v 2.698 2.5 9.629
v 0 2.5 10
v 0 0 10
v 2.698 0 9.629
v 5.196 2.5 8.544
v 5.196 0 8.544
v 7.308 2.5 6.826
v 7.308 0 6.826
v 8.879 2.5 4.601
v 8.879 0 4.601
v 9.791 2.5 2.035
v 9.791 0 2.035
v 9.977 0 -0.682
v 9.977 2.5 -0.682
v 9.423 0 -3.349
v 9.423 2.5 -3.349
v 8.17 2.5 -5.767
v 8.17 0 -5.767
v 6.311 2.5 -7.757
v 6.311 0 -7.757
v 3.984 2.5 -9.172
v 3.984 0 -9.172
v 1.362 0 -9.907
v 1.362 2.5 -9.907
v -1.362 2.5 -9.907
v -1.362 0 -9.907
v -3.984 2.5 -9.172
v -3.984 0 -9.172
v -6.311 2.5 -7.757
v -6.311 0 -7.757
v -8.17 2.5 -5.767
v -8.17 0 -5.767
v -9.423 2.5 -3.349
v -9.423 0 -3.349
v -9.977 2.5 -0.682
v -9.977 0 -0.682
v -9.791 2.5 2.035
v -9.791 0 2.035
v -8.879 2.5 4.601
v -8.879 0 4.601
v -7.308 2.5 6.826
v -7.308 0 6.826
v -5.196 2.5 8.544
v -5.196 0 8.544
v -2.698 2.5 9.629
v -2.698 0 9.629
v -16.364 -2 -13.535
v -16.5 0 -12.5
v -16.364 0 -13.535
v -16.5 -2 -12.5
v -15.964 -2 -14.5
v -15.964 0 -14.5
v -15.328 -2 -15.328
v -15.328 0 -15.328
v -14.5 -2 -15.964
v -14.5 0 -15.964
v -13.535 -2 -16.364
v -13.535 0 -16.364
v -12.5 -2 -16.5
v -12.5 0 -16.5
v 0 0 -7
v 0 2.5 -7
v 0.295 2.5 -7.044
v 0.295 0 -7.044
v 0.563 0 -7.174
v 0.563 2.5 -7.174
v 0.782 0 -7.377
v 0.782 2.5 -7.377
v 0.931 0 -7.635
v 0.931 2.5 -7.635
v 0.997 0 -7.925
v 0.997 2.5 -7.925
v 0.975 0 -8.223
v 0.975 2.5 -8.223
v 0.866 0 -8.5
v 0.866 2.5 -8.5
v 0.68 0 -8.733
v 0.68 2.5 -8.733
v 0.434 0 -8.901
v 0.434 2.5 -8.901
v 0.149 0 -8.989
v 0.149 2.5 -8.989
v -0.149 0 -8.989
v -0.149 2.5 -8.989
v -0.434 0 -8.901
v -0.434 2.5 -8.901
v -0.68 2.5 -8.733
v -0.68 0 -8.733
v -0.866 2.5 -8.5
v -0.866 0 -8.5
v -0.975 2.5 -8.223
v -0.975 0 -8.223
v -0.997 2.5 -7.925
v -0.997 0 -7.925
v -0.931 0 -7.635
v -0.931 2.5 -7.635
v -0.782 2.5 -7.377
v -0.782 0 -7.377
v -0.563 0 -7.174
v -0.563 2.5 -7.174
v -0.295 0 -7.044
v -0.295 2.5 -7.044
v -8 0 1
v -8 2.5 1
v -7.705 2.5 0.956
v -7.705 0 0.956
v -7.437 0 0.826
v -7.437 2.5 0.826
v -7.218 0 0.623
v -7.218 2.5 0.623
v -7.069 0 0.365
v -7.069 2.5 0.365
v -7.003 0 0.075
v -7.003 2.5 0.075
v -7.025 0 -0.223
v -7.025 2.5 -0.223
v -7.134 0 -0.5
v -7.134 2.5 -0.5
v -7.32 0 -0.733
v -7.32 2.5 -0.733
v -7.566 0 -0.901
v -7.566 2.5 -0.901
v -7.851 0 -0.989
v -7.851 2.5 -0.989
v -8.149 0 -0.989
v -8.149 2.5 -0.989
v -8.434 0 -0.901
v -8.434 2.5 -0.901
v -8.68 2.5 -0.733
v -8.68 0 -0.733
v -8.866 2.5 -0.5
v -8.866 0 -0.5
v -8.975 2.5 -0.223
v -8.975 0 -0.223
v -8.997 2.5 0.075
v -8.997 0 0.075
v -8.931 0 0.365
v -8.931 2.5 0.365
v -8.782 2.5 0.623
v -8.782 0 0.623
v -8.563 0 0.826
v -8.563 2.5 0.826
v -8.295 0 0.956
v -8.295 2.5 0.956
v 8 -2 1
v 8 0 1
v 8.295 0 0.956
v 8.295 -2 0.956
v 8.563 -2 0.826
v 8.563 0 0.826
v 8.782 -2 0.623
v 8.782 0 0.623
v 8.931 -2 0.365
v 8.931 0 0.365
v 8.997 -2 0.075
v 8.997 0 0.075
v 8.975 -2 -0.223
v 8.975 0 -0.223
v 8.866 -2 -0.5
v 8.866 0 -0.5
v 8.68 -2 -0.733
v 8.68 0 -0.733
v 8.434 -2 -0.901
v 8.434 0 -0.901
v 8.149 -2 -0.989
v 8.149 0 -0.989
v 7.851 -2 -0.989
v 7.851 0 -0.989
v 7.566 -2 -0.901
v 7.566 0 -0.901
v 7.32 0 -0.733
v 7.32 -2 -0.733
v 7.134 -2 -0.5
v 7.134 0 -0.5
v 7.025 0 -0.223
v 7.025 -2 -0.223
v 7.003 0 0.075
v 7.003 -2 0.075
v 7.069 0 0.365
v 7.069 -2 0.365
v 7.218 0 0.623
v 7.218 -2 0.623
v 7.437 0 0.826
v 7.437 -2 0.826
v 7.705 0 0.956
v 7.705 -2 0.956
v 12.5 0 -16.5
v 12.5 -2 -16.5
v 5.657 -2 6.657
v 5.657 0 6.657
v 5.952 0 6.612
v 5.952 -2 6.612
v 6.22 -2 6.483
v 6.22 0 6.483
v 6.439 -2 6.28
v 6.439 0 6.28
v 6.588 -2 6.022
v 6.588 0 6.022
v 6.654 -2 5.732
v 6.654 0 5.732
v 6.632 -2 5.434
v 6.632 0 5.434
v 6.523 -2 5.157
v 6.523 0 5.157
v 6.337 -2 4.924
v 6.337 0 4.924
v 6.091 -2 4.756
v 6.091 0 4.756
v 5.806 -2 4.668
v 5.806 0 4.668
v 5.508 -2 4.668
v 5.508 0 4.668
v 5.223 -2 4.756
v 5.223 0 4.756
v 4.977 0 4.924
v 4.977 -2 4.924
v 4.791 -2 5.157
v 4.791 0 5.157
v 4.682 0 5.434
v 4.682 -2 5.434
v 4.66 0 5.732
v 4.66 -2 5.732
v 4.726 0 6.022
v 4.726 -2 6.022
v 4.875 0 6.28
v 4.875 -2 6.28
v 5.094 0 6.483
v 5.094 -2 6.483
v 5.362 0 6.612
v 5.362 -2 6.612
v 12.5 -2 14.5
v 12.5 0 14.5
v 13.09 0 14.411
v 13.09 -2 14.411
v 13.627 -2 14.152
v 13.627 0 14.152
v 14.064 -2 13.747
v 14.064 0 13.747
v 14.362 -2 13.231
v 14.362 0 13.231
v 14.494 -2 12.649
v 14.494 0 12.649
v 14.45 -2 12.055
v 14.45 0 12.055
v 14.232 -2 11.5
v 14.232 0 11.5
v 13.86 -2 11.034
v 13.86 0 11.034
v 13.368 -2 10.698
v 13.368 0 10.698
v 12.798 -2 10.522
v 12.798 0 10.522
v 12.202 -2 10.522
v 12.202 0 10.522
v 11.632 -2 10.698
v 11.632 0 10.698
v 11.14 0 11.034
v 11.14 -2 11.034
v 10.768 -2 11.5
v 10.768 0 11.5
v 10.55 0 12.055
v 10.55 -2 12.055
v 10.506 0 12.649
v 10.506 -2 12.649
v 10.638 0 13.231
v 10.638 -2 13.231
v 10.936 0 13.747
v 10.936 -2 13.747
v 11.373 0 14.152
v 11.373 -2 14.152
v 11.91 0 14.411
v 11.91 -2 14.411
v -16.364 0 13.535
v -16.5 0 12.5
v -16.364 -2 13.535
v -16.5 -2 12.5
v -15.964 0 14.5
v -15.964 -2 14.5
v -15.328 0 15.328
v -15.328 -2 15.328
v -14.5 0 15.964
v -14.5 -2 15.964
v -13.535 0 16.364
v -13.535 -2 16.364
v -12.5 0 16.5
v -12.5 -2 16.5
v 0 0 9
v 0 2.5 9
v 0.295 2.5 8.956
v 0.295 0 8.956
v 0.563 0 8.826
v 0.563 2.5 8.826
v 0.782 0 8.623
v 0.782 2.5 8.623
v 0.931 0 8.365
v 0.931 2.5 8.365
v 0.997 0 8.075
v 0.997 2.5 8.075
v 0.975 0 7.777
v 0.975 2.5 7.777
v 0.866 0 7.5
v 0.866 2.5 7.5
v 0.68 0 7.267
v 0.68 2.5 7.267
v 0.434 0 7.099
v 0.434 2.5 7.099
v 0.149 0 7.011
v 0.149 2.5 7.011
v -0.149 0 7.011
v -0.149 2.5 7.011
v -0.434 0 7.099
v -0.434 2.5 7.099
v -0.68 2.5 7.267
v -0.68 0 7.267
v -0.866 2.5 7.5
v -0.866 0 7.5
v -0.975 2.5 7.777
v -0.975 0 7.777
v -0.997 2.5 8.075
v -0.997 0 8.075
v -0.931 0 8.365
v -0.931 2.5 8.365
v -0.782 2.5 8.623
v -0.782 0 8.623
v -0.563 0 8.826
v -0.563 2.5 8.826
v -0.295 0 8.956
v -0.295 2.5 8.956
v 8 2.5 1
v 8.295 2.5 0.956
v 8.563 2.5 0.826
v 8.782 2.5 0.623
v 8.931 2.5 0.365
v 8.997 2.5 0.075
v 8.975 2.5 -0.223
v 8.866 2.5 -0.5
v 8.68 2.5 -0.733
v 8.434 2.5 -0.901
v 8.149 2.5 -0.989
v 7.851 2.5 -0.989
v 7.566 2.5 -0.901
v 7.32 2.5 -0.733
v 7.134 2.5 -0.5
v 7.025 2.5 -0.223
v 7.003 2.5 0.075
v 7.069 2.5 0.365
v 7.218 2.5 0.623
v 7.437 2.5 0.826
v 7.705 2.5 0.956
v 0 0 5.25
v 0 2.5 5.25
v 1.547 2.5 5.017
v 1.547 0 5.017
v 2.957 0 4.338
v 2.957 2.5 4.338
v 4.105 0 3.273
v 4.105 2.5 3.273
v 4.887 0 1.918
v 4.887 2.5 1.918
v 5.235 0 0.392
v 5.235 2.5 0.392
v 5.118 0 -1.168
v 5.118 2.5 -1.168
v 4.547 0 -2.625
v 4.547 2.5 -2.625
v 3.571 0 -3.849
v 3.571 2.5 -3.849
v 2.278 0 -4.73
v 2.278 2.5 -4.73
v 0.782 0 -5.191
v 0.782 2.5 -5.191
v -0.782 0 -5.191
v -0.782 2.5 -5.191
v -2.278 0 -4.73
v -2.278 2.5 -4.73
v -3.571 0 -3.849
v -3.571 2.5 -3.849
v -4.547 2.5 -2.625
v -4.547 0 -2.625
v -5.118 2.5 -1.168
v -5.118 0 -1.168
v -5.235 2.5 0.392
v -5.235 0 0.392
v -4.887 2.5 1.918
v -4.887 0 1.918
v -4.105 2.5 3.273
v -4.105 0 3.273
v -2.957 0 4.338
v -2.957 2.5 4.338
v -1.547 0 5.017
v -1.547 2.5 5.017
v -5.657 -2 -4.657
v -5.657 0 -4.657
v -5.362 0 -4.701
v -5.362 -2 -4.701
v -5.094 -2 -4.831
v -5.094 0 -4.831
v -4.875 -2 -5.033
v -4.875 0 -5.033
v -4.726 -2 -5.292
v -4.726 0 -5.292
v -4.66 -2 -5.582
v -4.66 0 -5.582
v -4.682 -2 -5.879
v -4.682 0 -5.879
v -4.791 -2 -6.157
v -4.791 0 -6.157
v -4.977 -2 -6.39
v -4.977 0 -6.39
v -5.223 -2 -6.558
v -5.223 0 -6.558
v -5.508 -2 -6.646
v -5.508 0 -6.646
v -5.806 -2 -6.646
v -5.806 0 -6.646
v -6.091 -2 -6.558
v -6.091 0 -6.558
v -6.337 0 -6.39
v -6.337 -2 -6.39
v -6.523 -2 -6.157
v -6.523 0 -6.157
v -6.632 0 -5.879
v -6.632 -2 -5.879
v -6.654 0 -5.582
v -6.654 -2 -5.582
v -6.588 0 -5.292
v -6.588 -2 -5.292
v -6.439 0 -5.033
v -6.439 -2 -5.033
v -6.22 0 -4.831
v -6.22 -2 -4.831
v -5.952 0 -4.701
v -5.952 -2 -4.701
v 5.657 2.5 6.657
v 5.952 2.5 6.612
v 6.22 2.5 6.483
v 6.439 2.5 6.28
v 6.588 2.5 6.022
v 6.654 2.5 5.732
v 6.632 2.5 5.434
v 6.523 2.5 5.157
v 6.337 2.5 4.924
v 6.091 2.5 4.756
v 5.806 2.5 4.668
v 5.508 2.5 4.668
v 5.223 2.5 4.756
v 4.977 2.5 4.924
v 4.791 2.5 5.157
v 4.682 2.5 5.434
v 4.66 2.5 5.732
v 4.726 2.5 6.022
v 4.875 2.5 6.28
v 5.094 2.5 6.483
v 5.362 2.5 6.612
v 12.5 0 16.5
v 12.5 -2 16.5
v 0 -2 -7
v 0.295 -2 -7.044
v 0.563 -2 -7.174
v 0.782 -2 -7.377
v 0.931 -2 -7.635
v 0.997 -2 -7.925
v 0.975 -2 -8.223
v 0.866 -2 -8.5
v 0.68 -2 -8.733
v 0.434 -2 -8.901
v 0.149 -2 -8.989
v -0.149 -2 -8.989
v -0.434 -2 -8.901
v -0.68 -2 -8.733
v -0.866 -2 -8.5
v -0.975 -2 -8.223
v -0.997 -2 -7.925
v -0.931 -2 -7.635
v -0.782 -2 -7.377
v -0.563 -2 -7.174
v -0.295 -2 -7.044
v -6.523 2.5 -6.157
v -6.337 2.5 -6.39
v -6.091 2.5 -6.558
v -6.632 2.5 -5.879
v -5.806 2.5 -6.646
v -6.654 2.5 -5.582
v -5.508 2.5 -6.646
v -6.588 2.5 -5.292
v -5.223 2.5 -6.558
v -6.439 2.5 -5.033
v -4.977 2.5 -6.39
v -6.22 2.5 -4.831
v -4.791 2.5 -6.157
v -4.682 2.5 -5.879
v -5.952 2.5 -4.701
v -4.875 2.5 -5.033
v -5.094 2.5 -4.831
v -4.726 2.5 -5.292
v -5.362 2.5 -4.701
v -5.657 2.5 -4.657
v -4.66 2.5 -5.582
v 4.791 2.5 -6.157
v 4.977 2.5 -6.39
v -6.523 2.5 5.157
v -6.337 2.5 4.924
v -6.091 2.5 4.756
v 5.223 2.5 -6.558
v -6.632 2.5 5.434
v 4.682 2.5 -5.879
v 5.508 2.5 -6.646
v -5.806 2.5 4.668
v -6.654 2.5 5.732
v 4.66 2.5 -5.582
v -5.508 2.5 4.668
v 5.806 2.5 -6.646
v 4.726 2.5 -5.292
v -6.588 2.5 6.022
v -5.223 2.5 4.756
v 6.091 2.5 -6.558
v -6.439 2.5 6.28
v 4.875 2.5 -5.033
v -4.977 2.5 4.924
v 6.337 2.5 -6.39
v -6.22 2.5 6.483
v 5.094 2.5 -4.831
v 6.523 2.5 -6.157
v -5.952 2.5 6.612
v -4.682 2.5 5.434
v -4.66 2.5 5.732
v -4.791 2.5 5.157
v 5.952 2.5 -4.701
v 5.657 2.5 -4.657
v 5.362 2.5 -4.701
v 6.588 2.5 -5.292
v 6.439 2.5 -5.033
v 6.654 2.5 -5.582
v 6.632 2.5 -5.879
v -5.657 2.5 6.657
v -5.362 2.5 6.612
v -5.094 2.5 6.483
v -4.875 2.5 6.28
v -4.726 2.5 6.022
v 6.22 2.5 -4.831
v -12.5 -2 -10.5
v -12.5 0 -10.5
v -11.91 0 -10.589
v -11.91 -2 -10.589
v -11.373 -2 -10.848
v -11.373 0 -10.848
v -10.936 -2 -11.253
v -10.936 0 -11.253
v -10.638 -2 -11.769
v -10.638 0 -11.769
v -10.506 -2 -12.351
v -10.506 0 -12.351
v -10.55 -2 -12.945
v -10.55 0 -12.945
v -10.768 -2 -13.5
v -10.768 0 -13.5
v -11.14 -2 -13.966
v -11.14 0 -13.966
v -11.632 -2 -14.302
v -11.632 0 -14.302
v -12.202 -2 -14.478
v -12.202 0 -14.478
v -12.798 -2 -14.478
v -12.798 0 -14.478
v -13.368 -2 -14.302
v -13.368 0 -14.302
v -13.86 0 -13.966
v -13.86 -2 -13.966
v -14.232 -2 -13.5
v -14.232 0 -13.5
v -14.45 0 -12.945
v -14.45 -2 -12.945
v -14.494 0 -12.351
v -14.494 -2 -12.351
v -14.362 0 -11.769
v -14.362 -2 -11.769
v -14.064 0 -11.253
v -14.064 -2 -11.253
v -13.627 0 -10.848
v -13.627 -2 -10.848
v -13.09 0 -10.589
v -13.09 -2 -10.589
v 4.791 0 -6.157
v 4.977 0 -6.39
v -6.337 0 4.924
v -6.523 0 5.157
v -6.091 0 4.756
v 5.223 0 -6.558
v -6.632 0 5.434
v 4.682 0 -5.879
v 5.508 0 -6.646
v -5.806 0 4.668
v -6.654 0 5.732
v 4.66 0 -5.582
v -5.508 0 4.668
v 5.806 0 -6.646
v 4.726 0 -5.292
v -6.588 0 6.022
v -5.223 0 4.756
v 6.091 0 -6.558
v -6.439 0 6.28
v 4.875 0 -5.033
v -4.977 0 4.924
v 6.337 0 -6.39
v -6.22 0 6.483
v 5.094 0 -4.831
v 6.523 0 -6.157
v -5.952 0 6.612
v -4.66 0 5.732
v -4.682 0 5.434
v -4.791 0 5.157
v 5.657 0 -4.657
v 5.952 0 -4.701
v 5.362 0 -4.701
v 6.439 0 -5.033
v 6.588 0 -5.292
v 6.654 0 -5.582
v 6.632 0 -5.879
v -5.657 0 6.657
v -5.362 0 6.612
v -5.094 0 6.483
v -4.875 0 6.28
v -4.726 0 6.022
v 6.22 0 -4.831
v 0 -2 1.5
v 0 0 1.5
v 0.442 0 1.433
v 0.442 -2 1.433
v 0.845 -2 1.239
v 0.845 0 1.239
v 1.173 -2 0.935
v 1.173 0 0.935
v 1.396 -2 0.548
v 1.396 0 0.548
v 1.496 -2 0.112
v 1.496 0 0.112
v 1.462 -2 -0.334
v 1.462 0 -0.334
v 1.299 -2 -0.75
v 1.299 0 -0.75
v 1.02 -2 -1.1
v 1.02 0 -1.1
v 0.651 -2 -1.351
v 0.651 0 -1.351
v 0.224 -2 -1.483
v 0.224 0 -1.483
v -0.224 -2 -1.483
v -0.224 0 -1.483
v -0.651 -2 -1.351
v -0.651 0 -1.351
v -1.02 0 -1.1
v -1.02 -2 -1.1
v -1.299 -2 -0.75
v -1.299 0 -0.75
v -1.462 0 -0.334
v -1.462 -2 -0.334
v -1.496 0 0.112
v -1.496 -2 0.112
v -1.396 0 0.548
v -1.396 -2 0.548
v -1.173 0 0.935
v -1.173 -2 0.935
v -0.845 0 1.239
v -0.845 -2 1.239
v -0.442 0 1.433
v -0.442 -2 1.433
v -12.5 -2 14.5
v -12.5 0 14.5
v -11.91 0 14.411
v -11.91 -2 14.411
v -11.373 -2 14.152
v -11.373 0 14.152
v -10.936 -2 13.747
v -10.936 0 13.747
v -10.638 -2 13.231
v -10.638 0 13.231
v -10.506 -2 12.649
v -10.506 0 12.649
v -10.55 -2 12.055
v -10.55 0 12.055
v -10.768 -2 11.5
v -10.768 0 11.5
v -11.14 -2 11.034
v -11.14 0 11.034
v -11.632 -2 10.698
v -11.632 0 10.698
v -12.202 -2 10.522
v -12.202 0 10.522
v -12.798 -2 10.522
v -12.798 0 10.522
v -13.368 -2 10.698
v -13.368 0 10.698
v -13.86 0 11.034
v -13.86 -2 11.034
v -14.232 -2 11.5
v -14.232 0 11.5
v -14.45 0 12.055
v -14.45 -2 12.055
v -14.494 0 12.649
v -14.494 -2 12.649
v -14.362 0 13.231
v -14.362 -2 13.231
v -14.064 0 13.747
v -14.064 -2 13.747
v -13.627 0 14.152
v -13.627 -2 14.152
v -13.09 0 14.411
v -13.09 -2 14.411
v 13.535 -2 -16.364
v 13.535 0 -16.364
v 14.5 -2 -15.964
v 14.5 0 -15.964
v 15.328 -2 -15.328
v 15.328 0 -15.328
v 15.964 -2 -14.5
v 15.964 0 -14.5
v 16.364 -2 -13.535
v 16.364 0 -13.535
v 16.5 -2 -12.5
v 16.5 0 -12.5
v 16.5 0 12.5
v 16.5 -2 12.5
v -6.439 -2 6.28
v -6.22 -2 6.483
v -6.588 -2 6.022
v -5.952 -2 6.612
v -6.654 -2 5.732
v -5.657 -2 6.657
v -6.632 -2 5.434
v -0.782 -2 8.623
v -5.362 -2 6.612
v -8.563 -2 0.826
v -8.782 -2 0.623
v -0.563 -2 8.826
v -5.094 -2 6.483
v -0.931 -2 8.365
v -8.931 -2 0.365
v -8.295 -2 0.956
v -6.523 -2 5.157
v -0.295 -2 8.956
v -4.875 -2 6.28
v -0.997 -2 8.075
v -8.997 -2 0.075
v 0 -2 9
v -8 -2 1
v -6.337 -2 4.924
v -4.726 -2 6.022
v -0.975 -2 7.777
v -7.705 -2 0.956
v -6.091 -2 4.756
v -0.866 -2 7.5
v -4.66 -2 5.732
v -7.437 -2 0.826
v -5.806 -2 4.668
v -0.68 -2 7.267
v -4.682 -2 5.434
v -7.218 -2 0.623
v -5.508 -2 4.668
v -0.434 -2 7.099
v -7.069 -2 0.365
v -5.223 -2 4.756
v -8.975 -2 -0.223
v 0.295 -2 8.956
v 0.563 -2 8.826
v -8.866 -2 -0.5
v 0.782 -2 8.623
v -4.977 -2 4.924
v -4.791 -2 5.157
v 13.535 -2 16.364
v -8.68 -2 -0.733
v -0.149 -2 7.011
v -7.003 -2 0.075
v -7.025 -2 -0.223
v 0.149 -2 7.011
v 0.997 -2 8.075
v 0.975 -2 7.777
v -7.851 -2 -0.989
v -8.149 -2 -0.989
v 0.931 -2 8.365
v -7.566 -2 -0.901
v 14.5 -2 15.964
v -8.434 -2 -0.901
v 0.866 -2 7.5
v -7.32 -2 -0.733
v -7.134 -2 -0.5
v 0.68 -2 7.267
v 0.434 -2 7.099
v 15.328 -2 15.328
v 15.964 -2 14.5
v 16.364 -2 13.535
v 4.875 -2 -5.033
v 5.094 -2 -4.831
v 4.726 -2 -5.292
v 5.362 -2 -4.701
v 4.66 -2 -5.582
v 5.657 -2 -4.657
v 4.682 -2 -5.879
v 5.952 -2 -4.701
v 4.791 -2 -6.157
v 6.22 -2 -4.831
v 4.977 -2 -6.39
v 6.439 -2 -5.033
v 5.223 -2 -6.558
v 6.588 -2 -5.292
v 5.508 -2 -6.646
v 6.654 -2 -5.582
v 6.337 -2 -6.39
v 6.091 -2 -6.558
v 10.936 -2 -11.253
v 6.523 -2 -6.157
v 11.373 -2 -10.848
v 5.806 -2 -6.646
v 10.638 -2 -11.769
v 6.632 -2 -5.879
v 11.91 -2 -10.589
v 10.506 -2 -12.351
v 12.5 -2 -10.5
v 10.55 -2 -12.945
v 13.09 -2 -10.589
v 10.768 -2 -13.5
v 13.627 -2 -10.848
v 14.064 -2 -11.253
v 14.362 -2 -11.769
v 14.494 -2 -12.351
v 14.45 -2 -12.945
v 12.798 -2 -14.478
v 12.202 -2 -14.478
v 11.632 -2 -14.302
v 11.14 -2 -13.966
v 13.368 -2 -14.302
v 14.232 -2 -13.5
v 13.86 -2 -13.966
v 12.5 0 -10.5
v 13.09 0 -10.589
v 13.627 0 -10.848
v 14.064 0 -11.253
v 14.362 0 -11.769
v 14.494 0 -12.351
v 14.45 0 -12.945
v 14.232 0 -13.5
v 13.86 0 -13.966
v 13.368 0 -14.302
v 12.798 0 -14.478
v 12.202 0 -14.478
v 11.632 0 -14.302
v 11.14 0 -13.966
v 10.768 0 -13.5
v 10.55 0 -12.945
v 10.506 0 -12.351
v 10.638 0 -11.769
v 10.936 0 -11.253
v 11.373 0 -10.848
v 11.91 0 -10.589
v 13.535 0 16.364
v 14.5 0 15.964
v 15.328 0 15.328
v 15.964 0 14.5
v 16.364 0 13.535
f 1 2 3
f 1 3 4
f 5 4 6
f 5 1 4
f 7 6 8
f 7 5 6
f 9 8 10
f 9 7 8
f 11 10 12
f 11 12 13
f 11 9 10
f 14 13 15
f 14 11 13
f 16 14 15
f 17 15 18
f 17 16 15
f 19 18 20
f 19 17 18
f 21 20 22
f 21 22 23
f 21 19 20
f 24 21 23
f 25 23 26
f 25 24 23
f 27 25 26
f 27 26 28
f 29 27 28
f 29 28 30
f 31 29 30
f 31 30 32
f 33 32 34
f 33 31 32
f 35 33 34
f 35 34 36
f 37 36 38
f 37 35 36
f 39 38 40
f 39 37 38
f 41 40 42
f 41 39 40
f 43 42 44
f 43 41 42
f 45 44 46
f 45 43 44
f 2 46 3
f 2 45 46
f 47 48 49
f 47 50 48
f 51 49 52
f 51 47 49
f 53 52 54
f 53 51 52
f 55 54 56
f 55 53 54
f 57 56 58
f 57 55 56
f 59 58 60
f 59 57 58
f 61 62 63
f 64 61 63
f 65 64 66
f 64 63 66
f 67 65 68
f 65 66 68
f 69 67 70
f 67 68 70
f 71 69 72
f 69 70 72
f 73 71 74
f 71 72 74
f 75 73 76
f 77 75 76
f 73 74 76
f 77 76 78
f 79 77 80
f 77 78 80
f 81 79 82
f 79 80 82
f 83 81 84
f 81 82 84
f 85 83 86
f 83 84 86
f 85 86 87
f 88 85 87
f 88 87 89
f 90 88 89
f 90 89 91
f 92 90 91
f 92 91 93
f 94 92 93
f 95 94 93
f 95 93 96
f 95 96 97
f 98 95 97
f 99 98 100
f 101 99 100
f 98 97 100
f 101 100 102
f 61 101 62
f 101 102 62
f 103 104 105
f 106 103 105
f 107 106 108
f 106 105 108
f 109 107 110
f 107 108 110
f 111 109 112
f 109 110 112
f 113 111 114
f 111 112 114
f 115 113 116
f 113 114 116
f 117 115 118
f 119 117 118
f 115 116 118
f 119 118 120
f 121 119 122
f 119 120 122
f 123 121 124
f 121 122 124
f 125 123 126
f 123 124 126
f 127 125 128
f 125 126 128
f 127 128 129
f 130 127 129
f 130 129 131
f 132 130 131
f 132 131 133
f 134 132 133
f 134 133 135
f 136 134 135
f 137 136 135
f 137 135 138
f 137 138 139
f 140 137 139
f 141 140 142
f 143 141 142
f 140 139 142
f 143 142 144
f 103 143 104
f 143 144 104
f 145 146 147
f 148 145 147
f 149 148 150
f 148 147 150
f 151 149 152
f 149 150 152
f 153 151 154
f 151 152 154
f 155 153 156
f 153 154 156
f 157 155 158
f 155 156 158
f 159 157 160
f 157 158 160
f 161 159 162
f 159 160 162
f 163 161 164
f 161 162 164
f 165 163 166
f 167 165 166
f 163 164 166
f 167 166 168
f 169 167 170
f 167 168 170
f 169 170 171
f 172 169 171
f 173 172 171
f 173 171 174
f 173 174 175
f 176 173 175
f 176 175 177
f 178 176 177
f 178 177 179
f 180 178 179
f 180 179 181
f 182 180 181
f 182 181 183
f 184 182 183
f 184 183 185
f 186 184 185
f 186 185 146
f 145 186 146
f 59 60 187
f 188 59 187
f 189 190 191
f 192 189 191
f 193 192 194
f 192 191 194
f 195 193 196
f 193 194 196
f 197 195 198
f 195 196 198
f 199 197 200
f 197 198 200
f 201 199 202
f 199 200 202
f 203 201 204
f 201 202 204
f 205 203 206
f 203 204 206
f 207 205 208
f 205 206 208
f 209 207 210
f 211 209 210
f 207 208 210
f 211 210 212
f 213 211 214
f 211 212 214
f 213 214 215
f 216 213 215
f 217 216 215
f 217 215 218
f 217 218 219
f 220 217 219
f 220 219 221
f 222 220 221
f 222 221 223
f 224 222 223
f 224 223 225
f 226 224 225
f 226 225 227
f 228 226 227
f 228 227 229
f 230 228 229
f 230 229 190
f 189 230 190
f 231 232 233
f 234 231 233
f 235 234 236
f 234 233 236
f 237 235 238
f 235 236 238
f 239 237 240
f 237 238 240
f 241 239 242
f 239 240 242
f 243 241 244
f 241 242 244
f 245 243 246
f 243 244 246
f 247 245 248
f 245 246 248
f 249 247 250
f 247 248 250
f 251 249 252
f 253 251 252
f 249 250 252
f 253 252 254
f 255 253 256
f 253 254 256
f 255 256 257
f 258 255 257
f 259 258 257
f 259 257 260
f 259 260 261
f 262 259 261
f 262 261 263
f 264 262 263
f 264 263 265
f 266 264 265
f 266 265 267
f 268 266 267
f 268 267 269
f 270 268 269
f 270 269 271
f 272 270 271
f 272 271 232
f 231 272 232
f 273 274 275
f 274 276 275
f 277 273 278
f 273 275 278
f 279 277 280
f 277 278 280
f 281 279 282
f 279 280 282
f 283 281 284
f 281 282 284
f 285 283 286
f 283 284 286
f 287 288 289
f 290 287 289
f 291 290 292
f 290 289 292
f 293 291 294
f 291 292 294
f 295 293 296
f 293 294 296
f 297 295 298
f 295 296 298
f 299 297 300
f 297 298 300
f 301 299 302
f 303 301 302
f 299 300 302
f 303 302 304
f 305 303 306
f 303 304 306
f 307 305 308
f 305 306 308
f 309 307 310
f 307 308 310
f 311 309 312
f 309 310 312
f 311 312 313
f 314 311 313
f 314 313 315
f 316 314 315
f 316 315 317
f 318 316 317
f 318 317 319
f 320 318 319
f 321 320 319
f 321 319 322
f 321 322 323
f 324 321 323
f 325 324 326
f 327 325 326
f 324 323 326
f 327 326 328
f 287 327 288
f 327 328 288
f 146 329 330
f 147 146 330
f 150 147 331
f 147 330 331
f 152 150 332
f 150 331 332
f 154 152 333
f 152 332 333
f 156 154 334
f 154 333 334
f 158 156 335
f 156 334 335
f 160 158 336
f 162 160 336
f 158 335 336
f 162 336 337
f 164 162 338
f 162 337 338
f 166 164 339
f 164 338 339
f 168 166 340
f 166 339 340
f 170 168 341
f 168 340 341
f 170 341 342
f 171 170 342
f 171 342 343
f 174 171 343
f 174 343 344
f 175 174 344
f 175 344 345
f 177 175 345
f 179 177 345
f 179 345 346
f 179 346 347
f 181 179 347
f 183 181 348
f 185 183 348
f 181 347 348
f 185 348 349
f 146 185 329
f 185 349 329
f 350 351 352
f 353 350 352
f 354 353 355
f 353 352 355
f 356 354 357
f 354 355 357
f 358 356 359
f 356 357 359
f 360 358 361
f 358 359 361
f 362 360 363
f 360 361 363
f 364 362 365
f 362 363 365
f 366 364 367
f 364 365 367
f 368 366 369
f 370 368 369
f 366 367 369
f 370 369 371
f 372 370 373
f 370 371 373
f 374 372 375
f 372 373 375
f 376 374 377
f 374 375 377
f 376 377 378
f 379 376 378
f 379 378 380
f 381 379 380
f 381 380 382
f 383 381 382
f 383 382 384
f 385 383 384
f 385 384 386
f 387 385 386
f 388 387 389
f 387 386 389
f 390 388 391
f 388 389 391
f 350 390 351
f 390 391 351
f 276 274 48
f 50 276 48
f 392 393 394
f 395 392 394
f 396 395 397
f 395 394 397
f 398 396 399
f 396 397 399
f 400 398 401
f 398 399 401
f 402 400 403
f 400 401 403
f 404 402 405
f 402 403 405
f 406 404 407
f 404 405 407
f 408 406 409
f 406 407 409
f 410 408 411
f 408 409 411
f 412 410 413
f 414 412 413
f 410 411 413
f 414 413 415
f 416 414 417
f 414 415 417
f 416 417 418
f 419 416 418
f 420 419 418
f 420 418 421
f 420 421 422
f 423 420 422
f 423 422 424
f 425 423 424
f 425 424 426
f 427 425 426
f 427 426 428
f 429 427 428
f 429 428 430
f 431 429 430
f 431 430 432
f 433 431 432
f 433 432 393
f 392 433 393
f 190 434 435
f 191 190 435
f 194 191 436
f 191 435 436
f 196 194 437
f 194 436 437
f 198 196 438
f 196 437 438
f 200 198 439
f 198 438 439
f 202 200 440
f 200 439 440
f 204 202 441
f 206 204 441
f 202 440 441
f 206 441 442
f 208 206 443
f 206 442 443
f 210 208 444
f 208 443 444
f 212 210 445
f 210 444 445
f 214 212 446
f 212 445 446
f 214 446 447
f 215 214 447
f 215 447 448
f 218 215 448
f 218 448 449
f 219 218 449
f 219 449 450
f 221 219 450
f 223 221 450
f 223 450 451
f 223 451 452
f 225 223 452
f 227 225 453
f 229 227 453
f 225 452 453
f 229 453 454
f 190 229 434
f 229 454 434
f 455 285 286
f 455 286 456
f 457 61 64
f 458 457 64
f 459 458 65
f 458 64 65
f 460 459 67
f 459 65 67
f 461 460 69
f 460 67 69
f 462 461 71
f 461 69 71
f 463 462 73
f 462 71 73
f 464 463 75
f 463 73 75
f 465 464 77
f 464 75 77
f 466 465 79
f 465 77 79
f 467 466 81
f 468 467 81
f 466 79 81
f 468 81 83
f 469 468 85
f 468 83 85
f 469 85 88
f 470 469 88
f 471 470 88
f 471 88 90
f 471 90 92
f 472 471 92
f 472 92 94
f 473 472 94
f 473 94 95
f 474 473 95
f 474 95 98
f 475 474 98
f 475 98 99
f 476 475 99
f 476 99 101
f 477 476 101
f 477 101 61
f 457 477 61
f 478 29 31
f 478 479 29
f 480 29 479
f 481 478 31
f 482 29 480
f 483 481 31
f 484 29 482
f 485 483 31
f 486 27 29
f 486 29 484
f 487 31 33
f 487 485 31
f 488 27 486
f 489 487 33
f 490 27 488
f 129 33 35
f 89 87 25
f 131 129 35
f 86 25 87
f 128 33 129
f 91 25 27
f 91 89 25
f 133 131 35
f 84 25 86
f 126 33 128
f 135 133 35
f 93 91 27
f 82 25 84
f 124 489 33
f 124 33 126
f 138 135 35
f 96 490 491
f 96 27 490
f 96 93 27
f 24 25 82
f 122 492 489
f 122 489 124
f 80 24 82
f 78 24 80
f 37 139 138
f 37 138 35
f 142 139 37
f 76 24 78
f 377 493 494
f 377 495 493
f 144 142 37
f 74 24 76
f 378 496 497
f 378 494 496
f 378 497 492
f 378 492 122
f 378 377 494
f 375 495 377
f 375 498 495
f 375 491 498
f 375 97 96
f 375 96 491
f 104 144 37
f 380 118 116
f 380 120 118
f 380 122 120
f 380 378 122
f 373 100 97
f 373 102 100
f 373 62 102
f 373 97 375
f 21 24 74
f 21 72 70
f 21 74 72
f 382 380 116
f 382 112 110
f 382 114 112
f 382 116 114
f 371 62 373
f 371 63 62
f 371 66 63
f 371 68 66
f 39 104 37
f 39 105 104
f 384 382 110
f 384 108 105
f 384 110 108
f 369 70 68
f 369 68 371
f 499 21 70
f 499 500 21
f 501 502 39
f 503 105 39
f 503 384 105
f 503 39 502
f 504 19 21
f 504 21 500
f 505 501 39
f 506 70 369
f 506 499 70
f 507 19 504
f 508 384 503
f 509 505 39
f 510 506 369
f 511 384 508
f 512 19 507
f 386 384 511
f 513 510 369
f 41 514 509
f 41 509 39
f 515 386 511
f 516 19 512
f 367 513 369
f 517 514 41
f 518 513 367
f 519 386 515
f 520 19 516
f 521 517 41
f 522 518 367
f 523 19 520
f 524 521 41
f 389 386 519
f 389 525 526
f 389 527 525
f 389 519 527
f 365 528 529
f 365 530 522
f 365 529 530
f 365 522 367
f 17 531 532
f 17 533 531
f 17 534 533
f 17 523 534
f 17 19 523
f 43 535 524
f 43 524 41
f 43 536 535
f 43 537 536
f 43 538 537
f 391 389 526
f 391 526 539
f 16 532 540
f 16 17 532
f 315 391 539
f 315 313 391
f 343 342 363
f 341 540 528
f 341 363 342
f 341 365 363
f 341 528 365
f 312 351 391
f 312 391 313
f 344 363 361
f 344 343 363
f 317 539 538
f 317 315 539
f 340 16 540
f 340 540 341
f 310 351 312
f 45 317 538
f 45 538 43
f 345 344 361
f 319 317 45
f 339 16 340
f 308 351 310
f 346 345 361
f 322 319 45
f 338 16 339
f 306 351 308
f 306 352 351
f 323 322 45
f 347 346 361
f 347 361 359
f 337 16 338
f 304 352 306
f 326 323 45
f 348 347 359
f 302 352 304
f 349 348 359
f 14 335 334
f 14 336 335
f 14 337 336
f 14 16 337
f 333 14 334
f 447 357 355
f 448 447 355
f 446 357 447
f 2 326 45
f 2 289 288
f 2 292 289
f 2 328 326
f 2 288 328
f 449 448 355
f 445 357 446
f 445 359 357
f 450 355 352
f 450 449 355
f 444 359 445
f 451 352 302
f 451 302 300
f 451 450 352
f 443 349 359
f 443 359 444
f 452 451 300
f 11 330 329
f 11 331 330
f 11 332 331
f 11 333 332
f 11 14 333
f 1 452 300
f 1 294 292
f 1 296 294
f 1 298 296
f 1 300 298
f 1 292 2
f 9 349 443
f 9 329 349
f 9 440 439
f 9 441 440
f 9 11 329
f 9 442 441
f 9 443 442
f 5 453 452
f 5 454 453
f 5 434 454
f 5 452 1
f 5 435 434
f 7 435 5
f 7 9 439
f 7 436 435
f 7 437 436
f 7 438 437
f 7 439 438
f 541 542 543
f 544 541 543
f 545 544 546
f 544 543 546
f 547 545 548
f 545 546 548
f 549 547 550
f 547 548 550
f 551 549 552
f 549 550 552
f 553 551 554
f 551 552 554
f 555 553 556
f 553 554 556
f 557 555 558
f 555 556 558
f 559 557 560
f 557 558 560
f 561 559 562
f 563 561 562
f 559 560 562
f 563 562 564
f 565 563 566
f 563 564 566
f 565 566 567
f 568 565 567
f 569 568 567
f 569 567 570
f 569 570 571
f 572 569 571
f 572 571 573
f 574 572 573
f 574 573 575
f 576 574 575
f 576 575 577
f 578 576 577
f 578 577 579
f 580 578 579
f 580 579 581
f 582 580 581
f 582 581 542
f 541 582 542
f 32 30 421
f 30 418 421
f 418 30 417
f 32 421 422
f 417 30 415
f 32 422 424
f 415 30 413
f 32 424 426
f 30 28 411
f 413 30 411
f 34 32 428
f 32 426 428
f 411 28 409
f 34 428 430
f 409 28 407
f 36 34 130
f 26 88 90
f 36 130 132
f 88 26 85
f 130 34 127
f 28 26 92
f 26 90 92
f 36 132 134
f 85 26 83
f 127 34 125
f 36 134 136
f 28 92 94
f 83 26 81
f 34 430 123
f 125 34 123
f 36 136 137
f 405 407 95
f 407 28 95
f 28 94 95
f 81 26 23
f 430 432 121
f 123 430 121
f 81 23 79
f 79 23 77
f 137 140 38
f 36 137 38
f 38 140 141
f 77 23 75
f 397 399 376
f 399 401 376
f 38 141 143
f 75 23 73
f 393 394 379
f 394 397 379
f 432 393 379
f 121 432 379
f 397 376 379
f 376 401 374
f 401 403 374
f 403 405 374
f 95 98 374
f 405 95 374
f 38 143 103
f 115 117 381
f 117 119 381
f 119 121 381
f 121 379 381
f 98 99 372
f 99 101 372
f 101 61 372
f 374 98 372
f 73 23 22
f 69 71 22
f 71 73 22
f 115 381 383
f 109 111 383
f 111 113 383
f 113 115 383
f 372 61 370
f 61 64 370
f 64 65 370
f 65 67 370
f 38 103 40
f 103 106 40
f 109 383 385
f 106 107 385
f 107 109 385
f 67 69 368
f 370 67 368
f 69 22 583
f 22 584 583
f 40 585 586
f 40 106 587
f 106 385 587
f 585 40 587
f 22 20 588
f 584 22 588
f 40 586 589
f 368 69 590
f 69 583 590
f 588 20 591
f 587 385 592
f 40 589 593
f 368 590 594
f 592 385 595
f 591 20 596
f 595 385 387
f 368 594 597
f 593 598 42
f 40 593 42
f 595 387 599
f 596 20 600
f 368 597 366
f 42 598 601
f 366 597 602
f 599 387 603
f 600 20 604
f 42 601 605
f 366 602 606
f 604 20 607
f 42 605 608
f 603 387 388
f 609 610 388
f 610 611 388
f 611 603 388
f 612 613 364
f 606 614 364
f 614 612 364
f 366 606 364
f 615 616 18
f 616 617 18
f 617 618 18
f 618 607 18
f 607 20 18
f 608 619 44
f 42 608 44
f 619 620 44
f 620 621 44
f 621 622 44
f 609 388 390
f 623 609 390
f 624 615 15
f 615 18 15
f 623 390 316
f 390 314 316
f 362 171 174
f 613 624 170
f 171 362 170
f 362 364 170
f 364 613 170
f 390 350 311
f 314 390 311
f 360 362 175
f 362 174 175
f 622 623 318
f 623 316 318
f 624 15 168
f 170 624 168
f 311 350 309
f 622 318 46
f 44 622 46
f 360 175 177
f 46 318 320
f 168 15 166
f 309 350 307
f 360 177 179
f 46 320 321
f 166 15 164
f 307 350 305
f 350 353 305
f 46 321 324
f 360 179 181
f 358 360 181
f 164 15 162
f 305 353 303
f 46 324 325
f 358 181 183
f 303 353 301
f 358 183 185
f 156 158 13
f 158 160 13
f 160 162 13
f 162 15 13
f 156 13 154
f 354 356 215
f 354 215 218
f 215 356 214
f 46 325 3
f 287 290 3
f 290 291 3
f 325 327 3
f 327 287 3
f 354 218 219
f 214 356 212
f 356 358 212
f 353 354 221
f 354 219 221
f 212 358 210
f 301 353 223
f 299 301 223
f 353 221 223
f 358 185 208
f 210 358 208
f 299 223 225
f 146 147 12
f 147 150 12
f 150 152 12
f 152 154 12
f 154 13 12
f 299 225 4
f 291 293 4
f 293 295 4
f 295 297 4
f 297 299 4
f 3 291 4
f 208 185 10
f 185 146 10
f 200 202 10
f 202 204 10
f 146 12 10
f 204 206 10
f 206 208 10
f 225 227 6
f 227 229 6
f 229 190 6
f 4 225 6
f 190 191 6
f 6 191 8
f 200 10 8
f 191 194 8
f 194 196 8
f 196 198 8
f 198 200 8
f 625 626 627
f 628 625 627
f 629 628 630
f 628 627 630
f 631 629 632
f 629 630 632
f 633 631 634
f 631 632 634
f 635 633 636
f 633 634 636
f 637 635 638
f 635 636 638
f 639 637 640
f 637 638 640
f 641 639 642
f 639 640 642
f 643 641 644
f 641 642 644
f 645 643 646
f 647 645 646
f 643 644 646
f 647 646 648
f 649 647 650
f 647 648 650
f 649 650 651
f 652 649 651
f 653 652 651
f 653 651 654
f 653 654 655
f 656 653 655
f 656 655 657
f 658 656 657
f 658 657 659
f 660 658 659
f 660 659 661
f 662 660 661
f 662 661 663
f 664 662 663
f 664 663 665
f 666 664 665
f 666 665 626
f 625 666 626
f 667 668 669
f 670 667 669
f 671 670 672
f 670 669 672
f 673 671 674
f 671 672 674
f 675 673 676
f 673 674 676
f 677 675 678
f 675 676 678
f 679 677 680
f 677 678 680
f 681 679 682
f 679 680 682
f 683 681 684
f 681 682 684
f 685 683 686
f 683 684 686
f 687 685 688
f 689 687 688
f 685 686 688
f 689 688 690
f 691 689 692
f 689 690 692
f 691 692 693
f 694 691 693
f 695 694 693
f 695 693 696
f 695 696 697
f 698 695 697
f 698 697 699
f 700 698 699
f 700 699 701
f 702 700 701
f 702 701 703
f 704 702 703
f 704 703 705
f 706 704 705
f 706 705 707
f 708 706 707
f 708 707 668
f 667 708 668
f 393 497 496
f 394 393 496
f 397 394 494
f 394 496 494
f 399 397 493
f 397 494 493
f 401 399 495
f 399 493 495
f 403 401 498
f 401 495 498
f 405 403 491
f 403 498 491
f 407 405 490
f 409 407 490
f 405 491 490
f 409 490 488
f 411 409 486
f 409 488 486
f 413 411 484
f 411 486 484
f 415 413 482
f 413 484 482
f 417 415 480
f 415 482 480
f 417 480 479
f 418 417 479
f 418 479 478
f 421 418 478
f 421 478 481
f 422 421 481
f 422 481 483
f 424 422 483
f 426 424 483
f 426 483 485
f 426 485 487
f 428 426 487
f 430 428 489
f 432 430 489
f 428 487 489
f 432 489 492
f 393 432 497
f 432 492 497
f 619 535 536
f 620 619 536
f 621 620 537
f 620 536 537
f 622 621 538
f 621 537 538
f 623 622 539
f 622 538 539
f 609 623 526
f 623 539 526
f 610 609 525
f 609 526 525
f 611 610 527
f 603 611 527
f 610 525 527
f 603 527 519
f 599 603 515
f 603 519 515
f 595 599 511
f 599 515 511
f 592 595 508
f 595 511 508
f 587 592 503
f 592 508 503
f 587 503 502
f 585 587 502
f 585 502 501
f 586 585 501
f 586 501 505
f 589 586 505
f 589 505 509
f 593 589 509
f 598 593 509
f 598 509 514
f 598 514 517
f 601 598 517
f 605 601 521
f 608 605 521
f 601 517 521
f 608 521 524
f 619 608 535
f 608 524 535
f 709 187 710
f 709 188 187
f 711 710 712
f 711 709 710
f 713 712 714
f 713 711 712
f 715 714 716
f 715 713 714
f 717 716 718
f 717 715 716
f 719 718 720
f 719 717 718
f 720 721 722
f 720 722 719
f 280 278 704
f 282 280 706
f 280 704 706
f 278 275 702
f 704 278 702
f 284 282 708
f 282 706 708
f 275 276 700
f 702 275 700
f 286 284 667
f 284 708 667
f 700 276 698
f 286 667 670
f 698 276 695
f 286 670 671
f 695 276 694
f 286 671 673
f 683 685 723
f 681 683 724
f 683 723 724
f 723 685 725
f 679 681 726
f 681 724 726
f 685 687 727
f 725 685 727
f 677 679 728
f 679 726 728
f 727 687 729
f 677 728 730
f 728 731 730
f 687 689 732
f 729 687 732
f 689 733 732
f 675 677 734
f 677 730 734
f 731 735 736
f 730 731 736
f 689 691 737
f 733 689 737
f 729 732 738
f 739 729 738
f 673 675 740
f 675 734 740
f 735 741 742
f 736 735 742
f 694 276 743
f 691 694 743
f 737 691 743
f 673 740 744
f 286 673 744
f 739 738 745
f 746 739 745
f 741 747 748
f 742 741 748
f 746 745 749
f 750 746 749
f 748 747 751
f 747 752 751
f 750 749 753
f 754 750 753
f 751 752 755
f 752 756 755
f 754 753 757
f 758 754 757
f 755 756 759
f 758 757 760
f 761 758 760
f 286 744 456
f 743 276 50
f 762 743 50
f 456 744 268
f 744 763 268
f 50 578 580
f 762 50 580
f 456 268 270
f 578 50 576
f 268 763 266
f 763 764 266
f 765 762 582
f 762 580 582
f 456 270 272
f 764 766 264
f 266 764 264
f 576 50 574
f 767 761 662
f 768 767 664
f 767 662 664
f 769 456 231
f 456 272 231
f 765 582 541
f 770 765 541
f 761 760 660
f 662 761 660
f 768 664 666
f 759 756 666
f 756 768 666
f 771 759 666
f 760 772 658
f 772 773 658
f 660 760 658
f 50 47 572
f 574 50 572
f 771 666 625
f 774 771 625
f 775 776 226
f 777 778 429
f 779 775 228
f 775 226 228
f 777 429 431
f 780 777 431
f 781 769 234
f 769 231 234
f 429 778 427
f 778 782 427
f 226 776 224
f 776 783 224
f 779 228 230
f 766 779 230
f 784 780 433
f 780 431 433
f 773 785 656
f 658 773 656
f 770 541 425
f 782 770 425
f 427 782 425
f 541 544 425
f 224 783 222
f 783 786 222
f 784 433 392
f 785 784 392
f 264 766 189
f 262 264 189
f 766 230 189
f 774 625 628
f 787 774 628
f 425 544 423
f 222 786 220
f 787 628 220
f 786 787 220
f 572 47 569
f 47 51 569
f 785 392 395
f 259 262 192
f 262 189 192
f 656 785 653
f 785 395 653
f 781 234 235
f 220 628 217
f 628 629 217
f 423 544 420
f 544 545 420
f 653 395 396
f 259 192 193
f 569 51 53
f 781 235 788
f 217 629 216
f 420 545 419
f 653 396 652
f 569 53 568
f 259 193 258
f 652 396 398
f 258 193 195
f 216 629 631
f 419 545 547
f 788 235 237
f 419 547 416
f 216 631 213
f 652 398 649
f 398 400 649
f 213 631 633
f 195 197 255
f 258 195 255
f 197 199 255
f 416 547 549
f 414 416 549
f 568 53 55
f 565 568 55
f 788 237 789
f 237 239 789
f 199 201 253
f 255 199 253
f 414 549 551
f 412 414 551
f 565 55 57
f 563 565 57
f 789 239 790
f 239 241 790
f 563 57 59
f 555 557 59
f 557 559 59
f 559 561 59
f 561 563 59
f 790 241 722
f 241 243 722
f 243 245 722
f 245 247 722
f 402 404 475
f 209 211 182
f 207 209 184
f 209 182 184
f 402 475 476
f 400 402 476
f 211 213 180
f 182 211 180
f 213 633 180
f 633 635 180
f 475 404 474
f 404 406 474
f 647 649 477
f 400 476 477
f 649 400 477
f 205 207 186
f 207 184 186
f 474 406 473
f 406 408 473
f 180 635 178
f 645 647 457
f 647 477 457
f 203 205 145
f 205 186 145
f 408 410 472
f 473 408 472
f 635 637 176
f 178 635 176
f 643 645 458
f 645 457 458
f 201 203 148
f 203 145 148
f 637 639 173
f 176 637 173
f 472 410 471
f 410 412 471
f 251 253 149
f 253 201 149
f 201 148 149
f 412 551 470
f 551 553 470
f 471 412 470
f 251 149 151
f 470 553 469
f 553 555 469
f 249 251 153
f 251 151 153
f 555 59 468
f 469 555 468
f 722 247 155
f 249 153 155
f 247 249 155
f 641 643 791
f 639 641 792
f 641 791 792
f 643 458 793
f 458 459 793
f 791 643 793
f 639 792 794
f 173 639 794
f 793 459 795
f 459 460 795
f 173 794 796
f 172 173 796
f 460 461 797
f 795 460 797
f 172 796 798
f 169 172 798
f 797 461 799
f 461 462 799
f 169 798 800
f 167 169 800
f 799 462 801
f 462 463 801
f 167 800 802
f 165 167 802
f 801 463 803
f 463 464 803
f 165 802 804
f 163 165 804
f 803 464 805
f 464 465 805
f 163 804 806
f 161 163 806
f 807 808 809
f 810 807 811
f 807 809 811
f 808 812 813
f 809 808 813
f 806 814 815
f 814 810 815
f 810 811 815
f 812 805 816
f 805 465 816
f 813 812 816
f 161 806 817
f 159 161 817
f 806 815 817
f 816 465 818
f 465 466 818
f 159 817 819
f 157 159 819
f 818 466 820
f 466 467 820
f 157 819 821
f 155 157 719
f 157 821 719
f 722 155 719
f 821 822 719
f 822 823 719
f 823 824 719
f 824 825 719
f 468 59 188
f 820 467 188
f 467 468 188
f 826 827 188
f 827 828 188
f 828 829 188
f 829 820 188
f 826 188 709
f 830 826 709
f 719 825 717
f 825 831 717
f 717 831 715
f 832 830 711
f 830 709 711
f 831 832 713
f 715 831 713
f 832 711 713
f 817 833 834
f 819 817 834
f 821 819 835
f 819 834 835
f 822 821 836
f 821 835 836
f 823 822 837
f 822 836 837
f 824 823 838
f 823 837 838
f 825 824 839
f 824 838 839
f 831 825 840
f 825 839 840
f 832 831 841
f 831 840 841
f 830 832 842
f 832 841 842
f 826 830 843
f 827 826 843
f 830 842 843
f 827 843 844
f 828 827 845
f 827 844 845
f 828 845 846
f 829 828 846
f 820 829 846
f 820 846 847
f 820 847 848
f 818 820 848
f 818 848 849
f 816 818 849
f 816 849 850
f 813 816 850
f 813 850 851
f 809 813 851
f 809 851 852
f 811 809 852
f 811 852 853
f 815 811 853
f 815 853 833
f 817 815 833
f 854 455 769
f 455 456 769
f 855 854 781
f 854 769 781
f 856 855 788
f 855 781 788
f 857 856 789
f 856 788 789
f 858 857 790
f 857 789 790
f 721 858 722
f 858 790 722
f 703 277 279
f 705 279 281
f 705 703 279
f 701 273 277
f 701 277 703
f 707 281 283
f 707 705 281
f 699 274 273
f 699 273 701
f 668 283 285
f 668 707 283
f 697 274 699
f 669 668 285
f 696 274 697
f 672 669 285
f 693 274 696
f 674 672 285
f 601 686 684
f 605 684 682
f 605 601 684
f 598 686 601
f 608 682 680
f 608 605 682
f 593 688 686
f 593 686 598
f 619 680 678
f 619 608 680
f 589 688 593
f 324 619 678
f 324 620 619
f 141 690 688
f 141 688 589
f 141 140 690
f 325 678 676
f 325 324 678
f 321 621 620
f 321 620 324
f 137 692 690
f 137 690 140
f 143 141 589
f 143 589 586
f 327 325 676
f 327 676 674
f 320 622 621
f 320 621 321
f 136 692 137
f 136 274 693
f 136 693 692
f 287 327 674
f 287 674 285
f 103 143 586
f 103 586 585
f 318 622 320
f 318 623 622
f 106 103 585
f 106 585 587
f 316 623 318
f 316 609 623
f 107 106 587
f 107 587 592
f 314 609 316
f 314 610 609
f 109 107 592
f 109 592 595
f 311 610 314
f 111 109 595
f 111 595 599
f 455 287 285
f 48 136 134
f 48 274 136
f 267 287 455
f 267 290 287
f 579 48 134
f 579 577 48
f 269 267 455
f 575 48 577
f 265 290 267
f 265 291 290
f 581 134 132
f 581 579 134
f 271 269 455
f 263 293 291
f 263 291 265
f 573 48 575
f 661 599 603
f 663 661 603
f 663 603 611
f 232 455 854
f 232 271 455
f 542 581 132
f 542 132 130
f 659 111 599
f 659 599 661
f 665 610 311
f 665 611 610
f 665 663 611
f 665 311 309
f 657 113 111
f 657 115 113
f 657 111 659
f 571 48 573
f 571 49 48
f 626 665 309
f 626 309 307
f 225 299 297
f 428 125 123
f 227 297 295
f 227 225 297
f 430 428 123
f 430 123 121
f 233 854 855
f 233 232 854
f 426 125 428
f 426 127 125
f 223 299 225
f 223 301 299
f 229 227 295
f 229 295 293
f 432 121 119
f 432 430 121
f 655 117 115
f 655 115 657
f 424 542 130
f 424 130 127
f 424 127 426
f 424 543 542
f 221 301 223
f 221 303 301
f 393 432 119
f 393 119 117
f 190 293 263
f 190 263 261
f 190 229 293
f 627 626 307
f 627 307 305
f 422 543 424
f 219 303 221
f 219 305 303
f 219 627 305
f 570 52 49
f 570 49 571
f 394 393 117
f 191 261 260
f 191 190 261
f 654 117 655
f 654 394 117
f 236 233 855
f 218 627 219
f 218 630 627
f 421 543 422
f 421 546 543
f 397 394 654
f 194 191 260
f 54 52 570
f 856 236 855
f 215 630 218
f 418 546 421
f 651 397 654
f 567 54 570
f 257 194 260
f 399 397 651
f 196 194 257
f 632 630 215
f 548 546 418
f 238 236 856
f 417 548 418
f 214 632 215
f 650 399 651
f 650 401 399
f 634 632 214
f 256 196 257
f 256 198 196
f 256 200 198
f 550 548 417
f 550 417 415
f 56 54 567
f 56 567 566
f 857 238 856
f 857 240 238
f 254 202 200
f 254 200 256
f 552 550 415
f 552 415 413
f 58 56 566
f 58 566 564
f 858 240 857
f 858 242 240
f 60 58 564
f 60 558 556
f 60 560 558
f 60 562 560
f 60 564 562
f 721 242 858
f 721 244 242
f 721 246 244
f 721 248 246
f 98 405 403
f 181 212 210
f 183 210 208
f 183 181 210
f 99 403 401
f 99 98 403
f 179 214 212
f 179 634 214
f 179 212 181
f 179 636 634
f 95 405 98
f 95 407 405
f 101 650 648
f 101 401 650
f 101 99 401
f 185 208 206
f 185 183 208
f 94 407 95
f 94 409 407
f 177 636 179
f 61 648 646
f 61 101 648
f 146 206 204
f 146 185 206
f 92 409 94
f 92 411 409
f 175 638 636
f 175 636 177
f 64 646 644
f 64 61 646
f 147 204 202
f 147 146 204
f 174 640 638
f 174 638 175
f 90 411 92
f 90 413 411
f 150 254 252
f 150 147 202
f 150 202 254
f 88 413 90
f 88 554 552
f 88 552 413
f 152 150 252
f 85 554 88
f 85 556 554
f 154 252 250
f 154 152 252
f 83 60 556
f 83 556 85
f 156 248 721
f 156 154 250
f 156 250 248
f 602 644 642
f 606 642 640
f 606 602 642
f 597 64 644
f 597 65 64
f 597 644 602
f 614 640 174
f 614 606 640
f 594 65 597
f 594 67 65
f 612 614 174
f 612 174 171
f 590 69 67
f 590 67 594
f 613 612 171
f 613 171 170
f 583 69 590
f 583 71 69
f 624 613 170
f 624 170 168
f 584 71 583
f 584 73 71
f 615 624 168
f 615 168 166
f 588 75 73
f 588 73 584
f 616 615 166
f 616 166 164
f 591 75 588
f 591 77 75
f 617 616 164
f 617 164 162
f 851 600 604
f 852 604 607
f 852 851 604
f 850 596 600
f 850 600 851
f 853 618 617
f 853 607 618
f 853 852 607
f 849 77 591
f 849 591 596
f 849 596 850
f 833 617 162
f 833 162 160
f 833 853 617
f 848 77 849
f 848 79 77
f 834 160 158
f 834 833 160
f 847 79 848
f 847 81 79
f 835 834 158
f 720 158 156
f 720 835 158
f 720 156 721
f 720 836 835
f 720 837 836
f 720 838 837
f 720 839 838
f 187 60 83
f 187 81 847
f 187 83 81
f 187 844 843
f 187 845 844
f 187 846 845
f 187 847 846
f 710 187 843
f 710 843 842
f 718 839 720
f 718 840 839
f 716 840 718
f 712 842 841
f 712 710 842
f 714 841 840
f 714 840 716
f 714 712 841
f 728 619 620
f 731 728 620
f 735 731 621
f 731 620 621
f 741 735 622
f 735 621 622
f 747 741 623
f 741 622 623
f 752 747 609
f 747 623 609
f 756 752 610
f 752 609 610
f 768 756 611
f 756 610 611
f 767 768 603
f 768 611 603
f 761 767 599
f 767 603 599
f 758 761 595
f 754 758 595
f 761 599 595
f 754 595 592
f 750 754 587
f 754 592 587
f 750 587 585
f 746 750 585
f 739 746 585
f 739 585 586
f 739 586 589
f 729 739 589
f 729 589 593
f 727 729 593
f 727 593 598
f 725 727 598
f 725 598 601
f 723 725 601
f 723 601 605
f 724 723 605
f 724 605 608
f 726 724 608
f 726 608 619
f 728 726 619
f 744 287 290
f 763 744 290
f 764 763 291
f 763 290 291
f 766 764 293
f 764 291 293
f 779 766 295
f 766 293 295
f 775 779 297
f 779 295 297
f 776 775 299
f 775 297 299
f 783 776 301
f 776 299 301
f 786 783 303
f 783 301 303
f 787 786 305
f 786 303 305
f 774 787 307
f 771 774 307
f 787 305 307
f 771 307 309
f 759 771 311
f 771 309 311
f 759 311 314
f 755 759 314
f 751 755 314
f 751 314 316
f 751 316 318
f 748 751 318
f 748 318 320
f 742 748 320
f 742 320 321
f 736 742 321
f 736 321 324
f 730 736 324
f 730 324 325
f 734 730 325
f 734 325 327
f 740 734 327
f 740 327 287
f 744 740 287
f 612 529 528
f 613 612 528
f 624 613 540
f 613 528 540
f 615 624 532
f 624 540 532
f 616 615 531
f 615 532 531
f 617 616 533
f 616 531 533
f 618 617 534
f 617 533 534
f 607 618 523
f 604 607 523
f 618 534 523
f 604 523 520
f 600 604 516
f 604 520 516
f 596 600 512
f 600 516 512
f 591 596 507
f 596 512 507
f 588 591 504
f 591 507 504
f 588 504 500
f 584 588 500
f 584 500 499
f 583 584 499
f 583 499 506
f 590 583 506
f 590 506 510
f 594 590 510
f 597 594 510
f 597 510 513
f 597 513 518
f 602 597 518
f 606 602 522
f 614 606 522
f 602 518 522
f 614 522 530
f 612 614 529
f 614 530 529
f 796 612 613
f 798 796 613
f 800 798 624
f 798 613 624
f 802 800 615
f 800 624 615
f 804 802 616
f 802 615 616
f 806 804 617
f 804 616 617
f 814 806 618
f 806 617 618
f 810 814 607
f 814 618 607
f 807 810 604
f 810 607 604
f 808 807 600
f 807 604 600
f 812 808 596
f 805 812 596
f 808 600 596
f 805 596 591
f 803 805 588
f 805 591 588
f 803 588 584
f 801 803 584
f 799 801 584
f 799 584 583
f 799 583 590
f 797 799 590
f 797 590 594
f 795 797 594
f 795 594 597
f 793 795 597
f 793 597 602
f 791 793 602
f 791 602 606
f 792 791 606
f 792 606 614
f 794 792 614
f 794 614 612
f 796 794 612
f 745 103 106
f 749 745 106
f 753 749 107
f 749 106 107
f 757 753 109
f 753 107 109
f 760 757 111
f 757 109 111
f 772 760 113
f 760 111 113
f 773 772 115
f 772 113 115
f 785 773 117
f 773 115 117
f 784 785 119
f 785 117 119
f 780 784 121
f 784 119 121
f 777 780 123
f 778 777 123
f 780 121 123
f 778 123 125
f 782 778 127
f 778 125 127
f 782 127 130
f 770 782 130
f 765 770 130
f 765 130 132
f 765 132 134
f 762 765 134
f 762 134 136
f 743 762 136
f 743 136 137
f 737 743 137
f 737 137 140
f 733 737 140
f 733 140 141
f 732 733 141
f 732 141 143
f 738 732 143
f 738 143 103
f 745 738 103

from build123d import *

# Parameters (mm, degrees)
SKETCH_1_W             = 33
SKETCH_1_H             = 33
SM_BASE_FLANGE_1_DEPTH = 2
SKETCH_6_R             = 1
SKETCH_6_R_2           = 2
SKETCH_6_R_3           = 1.5
CUT_EXTRUDE_1_DEPTH    = 24.420076857
FILLET_1_R             = 4
SM_START               = 2.5
SKETCH_7_R             = 10
SKETCH_7_R_2           = 1
SKETCH_7_R_3           = 5.25
SM_BASE_FLANGE_2_DEPTH = 2.5


# Sheet-metal steps are written as plain solids
with BuildPart() as part:
    # Sketch 1 → 基体-法兰1 (new body)
    with BuildSketch(Plane(origin=(0, 0, 0), x_dir=(1, 0, 0), z_dir=(0, 1, 0))):
        Rectangle(SKETCH_1_W, SKETCH_1_H)
    extrude(amount=-SM_BASE_FLANGE_1_DEPTH)

    # 草图6 → 切除-拉伸1 (cut, through all)
    with BuildSketch(Plane(origin=(0, 0, 0), x_dir=(1, 0, 0), z_dir=(0, 1, 0))):
        with Locations(Location((0, 8, 0), (0, 0, 270))):
            Circle(SKETCH_6_R)
        with Locations(Location((5.656854249, 5.656854249, 0), (0, 0, 270))):
            Circle(SKETCH_6_R)
        with Locations(Location((8, 0, 0), (0, 0, 270))):
            Circle(SKETCH_6_R)
        with Locations(Location((5.656854249, -5.656854249, 0), (0, 0, 270))):
            Circle(SKETCH_6_R)
        with Locations(Location((0, -8, 0), (0, 0, 270))):
            Circle(SKETCH_6_R)
        with Locations(Location((-5.656854249, -5.656854249, 0), (0, 0, 270))):
            Circle(SKETCH_6_R)
        with Locations(Location((-8, 0, 0), (0, 0, 270))):
            Circle(SKETCH_6_R)
        with Locations(Location((-5.656854249, 5.656854249, 0), (0, 0, 270))):
            Circle(SKETCH_6_R)
        with Locations(Location((-12.5, 12.5, 0), (0, 0, 270))):
            Circle(SKETCH_6_R_2)
        with Locations(Location((12.5, 12.5, 0), (0, 0, 270))):
            Circle(SKETCH_6_R_2)
        with Locations(Location((12.5, -12.5, 0), (0, 0, 270))):
            Circle(SKETCH_6_R_2)
        with Locations(Location((-12.5, -12.5, 0), (0, 0, 270))):
            Circle(SKETCH_6_R_2)
        with Locations(Location((0, 0, 0), (0, 0, 270))):
            Circle(SKETCH_6_R_3)
    extrude(amount=-CUT_EXTRUDE_1_DEPTH, mode=Mode.SUBTRACT)

    # 圆角1
    fillet_1_edges = [part.edges().sort_by_distance(p)[0] for p in [
        (-16.5, -1, -16.5),
        (16.5, -1, -16.5),
        (16.5, -1, 16.5),
        (-16.5, -1, 16.5),
    ]]
    fillet(fillet_1_edges, radius=FILLET_1_R)


with BuildPart() as body_2:
    # 草图7 → 基体-法兰2 (new body)
    with BuildSketch(Plane(origin=(0, 0, 0), x_dir=(1, 0, 0), z_dir=(0, 1, 0)).offset(SM_START)):
        with Locations(Location((0, 0, 0), (0, 0, 270))):
            Circle(SKETCH_7_R)
        with Locations(Location((5.656854249, 5.656854249, 0), (0, 0, 270))):
            Circle(SKETCH_7_R_2, mode=Mode.SUBTRACT)
        with Locations(Location((8, 0, 0), (0, 0, 270))):
            Circle(SKETCH_7_R_2, mode=Mode.SUBTRACT)
        with Locations(Location((5.656854249, -5.656854249, 0), (0, 0, 270))):
            Circle(SKETCH_7_R_2, mode=Mode.SUBTRACT)
        with Locations(Location((0, -8, 0), (0, 0, 270))):
            Circle(SKETCH_7_R_2, mode=Mode.SUBTRACT)
        with Locations(Location((-5.656854249, -5.656854249, 0), (0, 0, 270))):
            Circle(SKETCH_7_R_2, mode=Mode.SUBTRACT)
        with Locations(Location((-8, 0, 0), (0, 0, 270))):
            Circle(SKETCH_7_R_2, mode=Mode.SUBTRACT)
        with Locations(Location((-5.656854249, 5.656854249, 0), (0, 0, 270))):
            Circle(SKETCH_7_R_2, mode=Mode.SUBTRACT)
        with Locations(Location((0, 8, 0), (0, 0, 270))):
            Circle(SKETCH_7_R_2, mode=Mode.SUBTRACT)
        with Locations(Location((0, 0, 0), (0, 0, 270))):
            Circle(SKETCH_7_R_3, mode=Mode.SUBTRACT)
    extrude(amount=-SM_BASE_FLANGE_2_DEPTH)


solid = Compound([part.part, body_2.part])
